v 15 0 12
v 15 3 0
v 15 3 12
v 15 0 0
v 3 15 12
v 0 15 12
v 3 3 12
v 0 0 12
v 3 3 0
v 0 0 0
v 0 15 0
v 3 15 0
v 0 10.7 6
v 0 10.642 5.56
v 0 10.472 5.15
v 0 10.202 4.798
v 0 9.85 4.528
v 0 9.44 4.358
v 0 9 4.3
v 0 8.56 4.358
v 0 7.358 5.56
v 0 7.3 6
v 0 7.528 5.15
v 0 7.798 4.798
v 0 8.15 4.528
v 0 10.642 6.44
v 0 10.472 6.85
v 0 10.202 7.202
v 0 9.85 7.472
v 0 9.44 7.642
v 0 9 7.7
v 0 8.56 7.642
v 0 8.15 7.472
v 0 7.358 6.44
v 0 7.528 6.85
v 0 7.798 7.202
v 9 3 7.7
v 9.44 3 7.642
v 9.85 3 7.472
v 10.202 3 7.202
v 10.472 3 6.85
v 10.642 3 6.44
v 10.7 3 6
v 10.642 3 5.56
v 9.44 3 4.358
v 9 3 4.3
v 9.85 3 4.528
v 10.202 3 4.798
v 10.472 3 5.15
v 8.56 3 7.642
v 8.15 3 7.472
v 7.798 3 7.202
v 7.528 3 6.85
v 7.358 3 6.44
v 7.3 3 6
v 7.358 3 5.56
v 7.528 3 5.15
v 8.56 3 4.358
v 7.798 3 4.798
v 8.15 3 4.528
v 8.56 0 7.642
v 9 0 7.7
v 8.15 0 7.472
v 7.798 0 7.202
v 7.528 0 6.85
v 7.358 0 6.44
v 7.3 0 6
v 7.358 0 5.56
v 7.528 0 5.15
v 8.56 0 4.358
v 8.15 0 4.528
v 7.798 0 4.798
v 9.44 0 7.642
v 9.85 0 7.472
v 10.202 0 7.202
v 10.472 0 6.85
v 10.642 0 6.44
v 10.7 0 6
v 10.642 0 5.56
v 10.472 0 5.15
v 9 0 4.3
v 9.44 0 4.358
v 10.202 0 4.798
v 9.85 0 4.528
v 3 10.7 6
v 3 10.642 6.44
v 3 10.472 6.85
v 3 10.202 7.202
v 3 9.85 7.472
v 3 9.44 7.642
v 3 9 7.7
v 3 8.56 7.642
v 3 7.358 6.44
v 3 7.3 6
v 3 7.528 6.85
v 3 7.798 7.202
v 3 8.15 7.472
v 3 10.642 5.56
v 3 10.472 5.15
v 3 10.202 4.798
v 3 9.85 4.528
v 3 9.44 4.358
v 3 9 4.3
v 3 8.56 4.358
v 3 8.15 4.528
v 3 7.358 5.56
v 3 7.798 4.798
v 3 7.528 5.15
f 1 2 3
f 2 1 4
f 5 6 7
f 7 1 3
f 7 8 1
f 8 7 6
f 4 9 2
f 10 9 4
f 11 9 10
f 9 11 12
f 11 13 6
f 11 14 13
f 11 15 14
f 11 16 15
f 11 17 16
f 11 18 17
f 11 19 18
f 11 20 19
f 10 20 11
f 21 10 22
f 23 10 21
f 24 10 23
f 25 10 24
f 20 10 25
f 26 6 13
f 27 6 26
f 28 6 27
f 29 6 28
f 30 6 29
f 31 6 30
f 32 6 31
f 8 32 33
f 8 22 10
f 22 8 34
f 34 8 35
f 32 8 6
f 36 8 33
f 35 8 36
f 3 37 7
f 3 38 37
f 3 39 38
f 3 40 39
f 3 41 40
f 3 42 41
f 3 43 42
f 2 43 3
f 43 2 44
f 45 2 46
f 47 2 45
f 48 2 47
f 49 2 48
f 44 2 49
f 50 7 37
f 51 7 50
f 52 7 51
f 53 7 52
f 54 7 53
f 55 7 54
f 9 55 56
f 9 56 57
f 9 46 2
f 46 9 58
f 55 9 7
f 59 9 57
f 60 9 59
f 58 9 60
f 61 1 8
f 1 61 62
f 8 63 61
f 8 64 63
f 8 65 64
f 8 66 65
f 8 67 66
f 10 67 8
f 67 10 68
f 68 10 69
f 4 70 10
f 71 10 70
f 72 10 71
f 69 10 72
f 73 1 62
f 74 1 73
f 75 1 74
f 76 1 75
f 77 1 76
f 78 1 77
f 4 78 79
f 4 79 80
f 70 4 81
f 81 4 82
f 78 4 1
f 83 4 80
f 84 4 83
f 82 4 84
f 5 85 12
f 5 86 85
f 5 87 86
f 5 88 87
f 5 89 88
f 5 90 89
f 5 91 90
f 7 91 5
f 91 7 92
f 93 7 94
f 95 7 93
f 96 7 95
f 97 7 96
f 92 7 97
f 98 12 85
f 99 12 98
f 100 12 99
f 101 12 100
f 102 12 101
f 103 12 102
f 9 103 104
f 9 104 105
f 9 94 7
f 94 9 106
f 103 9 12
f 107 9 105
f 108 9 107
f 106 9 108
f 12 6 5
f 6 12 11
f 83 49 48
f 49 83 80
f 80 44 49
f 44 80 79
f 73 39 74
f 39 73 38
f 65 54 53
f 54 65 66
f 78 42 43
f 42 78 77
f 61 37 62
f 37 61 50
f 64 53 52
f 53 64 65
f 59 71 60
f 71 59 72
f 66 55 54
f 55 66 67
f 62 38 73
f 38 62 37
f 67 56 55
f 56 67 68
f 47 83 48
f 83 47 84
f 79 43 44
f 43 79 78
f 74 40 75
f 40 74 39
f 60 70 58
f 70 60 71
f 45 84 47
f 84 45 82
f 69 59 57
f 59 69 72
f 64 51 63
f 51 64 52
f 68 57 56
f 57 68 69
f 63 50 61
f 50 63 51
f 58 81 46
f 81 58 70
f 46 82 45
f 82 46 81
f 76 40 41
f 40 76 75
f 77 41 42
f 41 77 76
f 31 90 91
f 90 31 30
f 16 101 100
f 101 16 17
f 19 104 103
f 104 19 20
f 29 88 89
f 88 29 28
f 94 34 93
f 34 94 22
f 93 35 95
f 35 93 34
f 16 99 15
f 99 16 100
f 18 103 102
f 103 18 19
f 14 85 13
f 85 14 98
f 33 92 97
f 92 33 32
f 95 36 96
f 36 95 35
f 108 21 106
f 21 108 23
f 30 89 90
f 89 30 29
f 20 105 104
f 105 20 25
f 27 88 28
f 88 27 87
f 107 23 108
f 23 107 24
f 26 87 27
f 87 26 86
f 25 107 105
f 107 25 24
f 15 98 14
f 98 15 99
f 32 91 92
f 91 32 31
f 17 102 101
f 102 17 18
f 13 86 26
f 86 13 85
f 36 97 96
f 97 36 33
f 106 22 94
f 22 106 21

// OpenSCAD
// Escaire d'unio per a caixa de DM de 3 mm (mascota). Imprimir x8 per robot.
gruix_dm = 3;
costat = 15;
ample = 12;
paret = 3;
difference() {
    union() {
        cube([costat, paret, ample]);
        cube([paret, costat, ample]);
    }
    translate([costat - 6, -1, ample / 2])
        rotate([-90, 0, 0]) cylinder(h = paret + 2, d = 3.4, $fn = 24);
    translate([-1, costat - 6, ample / 2])
        rotate([0, 90, 0]) cylinder(h = paret + 2, d = 3.4, $fn = 24);
}
